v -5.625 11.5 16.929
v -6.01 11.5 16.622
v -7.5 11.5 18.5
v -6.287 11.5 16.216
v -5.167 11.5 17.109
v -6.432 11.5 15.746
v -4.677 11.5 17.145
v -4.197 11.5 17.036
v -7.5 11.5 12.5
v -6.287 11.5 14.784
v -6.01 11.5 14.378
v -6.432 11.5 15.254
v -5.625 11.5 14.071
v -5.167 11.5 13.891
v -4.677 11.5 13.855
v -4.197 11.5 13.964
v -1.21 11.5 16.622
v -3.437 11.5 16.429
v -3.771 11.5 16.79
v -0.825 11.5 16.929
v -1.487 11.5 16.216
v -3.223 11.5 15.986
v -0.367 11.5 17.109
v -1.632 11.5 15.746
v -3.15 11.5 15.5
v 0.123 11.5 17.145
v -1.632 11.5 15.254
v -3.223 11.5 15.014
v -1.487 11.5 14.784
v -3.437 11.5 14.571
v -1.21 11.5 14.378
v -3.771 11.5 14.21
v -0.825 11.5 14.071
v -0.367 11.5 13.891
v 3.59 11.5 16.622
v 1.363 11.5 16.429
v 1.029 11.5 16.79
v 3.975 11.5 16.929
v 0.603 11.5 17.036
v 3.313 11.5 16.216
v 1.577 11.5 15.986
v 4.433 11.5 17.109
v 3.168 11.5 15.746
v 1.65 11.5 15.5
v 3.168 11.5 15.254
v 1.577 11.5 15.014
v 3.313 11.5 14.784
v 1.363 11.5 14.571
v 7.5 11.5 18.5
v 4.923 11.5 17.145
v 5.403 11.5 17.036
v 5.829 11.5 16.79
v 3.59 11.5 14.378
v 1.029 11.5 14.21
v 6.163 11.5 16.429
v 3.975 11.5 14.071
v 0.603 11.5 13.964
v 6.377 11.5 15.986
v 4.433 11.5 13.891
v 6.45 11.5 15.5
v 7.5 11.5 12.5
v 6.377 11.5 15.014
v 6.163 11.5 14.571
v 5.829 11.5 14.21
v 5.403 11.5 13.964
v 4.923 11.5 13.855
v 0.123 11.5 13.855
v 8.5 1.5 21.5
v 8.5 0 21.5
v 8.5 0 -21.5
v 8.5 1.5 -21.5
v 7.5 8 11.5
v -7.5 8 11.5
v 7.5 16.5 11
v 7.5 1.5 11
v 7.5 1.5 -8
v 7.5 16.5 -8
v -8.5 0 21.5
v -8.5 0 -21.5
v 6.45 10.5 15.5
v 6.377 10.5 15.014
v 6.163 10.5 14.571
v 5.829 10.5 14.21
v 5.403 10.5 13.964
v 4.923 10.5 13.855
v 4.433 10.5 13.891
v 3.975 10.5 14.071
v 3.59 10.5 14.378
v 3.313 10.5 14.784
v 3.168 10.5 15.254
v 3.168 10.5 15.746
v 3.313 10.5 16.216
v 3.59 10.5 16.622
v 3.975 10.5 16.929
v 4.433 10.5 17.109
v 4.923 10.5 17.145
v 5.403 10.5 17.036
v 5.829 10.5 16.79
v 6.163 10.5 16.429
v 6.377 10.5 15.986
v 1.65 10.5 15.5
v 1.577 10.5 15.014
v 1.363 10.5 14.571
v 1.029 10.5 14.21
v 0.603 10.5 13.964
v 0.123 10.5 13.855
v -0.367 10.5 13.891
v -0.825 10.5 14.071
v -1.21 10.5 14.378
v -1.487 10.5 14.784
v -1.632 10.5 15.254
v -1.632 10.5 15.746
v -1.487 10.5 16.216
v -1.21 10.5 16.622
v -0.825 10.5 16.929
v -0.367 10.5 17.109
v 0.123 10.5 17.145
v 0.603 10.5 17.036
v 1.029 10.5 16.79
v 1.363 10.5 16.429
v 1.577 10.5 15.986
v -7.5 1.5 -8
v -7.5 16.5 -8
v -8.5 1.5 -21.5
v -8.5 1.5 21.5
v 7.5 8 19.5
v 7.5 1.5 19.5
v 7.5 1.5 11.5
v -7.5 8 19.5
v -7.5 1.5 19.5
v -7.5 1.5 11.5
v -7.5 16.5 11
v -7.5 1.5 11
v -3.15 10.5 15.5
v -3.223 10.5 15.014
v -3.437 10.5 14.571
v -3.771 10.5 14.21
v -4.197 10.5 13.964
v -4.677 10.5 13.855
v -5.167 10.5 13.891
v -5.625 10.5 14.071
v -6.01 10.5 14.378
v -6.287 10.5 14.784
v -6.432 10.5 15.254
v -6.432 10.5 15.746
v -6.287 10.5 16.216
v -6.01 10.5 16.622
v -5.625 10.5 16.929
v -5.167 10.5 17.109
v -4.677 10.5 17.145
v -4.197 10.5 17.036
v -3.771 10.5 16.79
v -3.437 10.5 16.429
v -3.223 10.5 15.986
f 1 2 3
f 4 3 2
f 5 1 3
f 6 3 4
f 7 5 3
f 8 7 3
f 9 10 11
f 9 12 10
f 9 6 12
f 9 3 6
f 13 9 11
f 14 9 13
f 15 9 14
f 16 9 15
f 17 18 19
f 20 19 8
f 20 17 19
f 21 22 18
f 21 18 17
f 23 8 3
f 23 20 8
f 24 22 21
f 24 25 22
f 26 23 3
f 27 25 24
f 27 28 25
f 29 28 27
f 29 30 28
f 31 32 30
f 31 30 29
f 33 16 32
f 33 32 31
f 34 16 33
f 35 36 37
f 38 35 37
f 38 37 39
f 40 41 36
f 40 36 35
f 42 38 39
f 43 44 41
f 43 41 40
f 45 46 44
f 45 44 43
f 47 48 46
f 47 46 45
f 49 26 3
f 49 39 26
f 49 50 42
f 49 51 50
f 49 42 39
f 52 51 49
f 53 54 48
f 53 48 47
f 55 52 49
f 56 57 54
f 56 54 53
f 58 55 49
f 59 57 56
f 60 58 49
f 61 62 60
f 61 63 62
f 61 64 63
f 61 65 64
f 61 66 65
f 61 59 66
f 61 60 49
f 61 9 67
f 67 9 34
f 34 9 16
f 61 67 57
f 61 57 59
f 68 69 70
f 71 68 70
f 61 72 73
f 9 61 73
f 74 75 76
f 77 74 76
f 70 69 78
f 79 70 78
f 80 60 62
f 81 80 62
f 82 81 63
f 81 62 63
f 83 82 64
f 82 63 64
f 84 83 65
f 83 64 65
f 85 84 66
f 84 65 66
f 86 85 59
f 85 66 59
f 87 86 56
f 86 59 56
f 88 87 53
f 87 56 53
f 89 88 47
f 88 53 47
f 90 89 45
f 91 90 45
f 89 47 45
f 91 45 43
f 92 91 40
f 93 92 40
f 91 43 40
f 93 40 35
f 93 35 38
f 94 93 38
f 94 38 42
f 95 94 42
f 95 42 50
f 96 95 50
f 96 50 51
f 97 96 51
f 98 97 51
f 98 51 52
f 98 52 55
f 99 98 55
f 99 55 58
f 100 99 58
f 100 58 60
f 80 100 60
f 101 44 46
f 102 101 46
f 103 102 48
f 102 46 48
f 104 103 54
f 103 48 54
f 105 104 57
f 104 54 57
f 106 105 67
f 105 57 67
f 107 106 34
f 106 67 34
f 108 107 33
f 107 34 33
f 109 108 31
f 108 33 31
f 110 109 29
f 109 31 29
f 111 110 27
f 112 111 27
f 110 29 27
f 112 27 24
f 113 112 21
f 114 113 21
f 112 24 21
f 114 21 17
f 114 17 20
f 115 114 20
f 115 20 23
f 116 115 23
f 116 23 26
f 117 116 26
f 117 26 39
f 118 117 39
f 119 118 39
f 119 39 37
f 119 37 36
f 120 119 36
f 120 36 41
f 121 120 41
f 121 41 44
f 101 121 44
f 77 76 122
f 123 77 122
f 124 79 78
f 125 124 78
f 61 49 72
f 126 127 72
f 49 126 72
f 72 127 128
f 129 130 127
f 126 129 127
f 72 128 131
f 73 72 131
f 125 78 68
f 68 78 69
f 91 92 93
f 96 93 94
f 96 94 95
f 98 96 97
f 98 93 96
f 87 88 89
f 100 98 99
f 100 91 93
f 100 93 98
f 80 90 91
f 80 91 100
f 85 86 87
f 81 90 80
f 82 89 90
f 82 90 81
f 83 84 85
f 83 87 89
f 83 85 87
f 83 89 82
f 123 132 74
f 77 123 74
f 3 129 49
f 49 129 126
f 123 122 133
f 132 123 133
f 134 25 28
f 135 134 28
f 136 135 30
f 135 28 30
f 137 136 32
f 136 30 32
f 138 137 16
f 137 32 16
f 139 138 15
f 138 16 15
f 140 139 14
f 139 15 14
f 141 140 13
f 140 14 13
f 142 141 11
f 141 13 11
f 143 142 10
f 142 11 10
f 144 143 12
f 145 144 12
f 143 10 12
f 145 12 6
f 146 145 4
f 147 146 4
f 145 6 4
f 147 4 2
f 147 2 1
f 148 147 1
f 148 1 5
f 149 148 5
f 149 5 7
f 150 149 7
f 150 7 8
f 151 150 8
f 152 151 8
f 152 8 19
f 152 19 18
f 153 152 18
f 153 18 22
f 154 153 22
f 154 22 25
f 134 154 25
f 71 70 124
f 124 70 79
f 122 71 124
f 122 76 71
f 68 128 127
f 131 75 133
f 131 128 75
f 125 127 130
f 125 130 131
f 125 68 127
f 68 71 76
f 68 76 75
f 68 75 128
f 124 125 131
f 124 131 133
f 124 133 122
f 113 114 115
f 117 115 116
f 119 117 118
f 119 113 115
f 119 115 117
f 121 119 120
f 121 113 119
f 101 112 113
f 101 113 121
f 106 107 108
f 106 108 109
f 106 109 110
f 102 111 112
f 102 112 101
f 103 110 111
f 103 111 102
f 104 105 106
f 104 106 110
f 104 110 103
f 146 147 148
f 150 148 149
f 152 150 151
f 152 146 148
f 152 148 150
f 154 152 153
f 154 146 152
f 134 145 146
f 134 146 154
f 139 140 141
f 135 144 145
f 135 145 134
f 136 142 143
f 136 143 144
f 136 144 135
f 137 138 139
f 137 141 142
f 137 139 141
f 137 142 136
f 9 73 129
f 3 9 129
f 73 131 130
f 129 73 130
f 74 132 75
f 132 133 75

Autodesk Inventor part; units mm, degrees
ref_plane "YZ Plane" through (0, 0, 0) normal (1, 0, 0) x (0, 1, 0)
ref_plane "XZ Plane" through (0, 0, 0) normal (0, 1, 0) x (-1, 0, 0)
ref_plane "XY Plane" through (0, 0, 0) normal (0, 0, 1) x (1, 0, 0)
sketch "Sketch1" plane through (0, 0, 0) normal (0, 1, 0) x (-1, 0, 0)
  line L0 (8.5, 21.5) -> (-8.5, 21.5)
  line L1 (-8.5, 21.5) -> (-8.5, -21.5)
  line L2 (-8.5, -21.5) -> (8.5, -21.5)
  line L3 (8.5, -21.5) -> (8.5, 21.5)
  line L4 (-8.5, 21.5) -> (8.5, -21.5) construction
  point P0 (0, 0)
  point P1 (0, 0)
  dimension "d0" = 43
  dimension "d1" = 17
extrude "Extrusion1" add sketch "Sketch1" along normal blind 1.5
sketch "Sketch2" plane through (0, 1.5, 0) normal (0, 1, 0) x (1, 0, 0)
  line L0 (-7.5, -11) -> (7.5, -11)
  line L1 (7.5, -11) -> (7.5, 8)
  line L2 (7.5, 8) -> (-7.5, 8)
  line L3 (-7.5, 8) -> (-7.5, -11)
  line L4 (-8.5, -21.5) -> (8.5, -21.5) projected
  point P0 (0, 0)
  dimension "d4" = 19
  dimension "d5" = 15
  dimension "d6" = 7.5
  dimension "d8" = 10.5
extrude "Extrusion2" add sketch "Sketch2" along normal blind 15
sketch "Sketch3" plane through (0, 1.5, 0) normal (0, 1, 0) x (1, 0, 0)
  line L0 (7.5, -11.5) -> (-7.5, -11.5)
  line L1 (-7.5, -11.5) -> (-7.5, -19.5)
  line L2 (-7.5, -19.5) -> (7.5, -19.5)
  line L3 (7.5, -19.5) -> (7.5, -11.5)
  line L4 (-7.5, -11) -> (7.5, -11) projected
  point P0 (0, 0)
  dimension "d11" = 15
  dimension "d12" = 8
  dimension "d13" = 0.5
  dimension "d14" = 7.5
extrude "Extrusion3" add sketch "Sketch3" along normal blind 10
chamfer "Chamfer1" distance 1 distance2 3.5 1 edges at (0, 11.5, 19.5) measured on face at (2.5, 11.5, 16.8333)
chamfer "Chamfer2" distance 1 distance2 3.5 1 edges at (0, 11.5, 11.5) measured on face at (2.5, 11.5, 16.1667)
sketch "Sketch4" plane through (0, 11.5, 0) normal (0, 1, 0) x (1, 0, 0)
  circle A0 centre (-4.8, -15.5) radius 1.65
  line L0 (-7.5, -12.5) -> (-7.5, -18.5) projected
  line L1 (-3.2324, -14.8041) -> (3.2927, -14.8041) construction
  circle A1 centre (0, -15.5) radius 1.65
  circle A2 centre (4.8, -15.5) radius 1.65
  point P0 (0, 0)
  dimension "d23" = 3.3
  dimension "d24" = 2.7
  dimension "d27" = 4.8
  dimension "d32" = 6
  dimension "d33" = 3
extrude "Extrusion4" cut sketch "Sketch4" against normal blind 1
equation "\"d6\" = 0.5 * d5"
equation "\"d14\" = 0.5 * d11"
equation "\"d33\" = 0.5 * d32"
properties part number "Relay w Breakout Board"
